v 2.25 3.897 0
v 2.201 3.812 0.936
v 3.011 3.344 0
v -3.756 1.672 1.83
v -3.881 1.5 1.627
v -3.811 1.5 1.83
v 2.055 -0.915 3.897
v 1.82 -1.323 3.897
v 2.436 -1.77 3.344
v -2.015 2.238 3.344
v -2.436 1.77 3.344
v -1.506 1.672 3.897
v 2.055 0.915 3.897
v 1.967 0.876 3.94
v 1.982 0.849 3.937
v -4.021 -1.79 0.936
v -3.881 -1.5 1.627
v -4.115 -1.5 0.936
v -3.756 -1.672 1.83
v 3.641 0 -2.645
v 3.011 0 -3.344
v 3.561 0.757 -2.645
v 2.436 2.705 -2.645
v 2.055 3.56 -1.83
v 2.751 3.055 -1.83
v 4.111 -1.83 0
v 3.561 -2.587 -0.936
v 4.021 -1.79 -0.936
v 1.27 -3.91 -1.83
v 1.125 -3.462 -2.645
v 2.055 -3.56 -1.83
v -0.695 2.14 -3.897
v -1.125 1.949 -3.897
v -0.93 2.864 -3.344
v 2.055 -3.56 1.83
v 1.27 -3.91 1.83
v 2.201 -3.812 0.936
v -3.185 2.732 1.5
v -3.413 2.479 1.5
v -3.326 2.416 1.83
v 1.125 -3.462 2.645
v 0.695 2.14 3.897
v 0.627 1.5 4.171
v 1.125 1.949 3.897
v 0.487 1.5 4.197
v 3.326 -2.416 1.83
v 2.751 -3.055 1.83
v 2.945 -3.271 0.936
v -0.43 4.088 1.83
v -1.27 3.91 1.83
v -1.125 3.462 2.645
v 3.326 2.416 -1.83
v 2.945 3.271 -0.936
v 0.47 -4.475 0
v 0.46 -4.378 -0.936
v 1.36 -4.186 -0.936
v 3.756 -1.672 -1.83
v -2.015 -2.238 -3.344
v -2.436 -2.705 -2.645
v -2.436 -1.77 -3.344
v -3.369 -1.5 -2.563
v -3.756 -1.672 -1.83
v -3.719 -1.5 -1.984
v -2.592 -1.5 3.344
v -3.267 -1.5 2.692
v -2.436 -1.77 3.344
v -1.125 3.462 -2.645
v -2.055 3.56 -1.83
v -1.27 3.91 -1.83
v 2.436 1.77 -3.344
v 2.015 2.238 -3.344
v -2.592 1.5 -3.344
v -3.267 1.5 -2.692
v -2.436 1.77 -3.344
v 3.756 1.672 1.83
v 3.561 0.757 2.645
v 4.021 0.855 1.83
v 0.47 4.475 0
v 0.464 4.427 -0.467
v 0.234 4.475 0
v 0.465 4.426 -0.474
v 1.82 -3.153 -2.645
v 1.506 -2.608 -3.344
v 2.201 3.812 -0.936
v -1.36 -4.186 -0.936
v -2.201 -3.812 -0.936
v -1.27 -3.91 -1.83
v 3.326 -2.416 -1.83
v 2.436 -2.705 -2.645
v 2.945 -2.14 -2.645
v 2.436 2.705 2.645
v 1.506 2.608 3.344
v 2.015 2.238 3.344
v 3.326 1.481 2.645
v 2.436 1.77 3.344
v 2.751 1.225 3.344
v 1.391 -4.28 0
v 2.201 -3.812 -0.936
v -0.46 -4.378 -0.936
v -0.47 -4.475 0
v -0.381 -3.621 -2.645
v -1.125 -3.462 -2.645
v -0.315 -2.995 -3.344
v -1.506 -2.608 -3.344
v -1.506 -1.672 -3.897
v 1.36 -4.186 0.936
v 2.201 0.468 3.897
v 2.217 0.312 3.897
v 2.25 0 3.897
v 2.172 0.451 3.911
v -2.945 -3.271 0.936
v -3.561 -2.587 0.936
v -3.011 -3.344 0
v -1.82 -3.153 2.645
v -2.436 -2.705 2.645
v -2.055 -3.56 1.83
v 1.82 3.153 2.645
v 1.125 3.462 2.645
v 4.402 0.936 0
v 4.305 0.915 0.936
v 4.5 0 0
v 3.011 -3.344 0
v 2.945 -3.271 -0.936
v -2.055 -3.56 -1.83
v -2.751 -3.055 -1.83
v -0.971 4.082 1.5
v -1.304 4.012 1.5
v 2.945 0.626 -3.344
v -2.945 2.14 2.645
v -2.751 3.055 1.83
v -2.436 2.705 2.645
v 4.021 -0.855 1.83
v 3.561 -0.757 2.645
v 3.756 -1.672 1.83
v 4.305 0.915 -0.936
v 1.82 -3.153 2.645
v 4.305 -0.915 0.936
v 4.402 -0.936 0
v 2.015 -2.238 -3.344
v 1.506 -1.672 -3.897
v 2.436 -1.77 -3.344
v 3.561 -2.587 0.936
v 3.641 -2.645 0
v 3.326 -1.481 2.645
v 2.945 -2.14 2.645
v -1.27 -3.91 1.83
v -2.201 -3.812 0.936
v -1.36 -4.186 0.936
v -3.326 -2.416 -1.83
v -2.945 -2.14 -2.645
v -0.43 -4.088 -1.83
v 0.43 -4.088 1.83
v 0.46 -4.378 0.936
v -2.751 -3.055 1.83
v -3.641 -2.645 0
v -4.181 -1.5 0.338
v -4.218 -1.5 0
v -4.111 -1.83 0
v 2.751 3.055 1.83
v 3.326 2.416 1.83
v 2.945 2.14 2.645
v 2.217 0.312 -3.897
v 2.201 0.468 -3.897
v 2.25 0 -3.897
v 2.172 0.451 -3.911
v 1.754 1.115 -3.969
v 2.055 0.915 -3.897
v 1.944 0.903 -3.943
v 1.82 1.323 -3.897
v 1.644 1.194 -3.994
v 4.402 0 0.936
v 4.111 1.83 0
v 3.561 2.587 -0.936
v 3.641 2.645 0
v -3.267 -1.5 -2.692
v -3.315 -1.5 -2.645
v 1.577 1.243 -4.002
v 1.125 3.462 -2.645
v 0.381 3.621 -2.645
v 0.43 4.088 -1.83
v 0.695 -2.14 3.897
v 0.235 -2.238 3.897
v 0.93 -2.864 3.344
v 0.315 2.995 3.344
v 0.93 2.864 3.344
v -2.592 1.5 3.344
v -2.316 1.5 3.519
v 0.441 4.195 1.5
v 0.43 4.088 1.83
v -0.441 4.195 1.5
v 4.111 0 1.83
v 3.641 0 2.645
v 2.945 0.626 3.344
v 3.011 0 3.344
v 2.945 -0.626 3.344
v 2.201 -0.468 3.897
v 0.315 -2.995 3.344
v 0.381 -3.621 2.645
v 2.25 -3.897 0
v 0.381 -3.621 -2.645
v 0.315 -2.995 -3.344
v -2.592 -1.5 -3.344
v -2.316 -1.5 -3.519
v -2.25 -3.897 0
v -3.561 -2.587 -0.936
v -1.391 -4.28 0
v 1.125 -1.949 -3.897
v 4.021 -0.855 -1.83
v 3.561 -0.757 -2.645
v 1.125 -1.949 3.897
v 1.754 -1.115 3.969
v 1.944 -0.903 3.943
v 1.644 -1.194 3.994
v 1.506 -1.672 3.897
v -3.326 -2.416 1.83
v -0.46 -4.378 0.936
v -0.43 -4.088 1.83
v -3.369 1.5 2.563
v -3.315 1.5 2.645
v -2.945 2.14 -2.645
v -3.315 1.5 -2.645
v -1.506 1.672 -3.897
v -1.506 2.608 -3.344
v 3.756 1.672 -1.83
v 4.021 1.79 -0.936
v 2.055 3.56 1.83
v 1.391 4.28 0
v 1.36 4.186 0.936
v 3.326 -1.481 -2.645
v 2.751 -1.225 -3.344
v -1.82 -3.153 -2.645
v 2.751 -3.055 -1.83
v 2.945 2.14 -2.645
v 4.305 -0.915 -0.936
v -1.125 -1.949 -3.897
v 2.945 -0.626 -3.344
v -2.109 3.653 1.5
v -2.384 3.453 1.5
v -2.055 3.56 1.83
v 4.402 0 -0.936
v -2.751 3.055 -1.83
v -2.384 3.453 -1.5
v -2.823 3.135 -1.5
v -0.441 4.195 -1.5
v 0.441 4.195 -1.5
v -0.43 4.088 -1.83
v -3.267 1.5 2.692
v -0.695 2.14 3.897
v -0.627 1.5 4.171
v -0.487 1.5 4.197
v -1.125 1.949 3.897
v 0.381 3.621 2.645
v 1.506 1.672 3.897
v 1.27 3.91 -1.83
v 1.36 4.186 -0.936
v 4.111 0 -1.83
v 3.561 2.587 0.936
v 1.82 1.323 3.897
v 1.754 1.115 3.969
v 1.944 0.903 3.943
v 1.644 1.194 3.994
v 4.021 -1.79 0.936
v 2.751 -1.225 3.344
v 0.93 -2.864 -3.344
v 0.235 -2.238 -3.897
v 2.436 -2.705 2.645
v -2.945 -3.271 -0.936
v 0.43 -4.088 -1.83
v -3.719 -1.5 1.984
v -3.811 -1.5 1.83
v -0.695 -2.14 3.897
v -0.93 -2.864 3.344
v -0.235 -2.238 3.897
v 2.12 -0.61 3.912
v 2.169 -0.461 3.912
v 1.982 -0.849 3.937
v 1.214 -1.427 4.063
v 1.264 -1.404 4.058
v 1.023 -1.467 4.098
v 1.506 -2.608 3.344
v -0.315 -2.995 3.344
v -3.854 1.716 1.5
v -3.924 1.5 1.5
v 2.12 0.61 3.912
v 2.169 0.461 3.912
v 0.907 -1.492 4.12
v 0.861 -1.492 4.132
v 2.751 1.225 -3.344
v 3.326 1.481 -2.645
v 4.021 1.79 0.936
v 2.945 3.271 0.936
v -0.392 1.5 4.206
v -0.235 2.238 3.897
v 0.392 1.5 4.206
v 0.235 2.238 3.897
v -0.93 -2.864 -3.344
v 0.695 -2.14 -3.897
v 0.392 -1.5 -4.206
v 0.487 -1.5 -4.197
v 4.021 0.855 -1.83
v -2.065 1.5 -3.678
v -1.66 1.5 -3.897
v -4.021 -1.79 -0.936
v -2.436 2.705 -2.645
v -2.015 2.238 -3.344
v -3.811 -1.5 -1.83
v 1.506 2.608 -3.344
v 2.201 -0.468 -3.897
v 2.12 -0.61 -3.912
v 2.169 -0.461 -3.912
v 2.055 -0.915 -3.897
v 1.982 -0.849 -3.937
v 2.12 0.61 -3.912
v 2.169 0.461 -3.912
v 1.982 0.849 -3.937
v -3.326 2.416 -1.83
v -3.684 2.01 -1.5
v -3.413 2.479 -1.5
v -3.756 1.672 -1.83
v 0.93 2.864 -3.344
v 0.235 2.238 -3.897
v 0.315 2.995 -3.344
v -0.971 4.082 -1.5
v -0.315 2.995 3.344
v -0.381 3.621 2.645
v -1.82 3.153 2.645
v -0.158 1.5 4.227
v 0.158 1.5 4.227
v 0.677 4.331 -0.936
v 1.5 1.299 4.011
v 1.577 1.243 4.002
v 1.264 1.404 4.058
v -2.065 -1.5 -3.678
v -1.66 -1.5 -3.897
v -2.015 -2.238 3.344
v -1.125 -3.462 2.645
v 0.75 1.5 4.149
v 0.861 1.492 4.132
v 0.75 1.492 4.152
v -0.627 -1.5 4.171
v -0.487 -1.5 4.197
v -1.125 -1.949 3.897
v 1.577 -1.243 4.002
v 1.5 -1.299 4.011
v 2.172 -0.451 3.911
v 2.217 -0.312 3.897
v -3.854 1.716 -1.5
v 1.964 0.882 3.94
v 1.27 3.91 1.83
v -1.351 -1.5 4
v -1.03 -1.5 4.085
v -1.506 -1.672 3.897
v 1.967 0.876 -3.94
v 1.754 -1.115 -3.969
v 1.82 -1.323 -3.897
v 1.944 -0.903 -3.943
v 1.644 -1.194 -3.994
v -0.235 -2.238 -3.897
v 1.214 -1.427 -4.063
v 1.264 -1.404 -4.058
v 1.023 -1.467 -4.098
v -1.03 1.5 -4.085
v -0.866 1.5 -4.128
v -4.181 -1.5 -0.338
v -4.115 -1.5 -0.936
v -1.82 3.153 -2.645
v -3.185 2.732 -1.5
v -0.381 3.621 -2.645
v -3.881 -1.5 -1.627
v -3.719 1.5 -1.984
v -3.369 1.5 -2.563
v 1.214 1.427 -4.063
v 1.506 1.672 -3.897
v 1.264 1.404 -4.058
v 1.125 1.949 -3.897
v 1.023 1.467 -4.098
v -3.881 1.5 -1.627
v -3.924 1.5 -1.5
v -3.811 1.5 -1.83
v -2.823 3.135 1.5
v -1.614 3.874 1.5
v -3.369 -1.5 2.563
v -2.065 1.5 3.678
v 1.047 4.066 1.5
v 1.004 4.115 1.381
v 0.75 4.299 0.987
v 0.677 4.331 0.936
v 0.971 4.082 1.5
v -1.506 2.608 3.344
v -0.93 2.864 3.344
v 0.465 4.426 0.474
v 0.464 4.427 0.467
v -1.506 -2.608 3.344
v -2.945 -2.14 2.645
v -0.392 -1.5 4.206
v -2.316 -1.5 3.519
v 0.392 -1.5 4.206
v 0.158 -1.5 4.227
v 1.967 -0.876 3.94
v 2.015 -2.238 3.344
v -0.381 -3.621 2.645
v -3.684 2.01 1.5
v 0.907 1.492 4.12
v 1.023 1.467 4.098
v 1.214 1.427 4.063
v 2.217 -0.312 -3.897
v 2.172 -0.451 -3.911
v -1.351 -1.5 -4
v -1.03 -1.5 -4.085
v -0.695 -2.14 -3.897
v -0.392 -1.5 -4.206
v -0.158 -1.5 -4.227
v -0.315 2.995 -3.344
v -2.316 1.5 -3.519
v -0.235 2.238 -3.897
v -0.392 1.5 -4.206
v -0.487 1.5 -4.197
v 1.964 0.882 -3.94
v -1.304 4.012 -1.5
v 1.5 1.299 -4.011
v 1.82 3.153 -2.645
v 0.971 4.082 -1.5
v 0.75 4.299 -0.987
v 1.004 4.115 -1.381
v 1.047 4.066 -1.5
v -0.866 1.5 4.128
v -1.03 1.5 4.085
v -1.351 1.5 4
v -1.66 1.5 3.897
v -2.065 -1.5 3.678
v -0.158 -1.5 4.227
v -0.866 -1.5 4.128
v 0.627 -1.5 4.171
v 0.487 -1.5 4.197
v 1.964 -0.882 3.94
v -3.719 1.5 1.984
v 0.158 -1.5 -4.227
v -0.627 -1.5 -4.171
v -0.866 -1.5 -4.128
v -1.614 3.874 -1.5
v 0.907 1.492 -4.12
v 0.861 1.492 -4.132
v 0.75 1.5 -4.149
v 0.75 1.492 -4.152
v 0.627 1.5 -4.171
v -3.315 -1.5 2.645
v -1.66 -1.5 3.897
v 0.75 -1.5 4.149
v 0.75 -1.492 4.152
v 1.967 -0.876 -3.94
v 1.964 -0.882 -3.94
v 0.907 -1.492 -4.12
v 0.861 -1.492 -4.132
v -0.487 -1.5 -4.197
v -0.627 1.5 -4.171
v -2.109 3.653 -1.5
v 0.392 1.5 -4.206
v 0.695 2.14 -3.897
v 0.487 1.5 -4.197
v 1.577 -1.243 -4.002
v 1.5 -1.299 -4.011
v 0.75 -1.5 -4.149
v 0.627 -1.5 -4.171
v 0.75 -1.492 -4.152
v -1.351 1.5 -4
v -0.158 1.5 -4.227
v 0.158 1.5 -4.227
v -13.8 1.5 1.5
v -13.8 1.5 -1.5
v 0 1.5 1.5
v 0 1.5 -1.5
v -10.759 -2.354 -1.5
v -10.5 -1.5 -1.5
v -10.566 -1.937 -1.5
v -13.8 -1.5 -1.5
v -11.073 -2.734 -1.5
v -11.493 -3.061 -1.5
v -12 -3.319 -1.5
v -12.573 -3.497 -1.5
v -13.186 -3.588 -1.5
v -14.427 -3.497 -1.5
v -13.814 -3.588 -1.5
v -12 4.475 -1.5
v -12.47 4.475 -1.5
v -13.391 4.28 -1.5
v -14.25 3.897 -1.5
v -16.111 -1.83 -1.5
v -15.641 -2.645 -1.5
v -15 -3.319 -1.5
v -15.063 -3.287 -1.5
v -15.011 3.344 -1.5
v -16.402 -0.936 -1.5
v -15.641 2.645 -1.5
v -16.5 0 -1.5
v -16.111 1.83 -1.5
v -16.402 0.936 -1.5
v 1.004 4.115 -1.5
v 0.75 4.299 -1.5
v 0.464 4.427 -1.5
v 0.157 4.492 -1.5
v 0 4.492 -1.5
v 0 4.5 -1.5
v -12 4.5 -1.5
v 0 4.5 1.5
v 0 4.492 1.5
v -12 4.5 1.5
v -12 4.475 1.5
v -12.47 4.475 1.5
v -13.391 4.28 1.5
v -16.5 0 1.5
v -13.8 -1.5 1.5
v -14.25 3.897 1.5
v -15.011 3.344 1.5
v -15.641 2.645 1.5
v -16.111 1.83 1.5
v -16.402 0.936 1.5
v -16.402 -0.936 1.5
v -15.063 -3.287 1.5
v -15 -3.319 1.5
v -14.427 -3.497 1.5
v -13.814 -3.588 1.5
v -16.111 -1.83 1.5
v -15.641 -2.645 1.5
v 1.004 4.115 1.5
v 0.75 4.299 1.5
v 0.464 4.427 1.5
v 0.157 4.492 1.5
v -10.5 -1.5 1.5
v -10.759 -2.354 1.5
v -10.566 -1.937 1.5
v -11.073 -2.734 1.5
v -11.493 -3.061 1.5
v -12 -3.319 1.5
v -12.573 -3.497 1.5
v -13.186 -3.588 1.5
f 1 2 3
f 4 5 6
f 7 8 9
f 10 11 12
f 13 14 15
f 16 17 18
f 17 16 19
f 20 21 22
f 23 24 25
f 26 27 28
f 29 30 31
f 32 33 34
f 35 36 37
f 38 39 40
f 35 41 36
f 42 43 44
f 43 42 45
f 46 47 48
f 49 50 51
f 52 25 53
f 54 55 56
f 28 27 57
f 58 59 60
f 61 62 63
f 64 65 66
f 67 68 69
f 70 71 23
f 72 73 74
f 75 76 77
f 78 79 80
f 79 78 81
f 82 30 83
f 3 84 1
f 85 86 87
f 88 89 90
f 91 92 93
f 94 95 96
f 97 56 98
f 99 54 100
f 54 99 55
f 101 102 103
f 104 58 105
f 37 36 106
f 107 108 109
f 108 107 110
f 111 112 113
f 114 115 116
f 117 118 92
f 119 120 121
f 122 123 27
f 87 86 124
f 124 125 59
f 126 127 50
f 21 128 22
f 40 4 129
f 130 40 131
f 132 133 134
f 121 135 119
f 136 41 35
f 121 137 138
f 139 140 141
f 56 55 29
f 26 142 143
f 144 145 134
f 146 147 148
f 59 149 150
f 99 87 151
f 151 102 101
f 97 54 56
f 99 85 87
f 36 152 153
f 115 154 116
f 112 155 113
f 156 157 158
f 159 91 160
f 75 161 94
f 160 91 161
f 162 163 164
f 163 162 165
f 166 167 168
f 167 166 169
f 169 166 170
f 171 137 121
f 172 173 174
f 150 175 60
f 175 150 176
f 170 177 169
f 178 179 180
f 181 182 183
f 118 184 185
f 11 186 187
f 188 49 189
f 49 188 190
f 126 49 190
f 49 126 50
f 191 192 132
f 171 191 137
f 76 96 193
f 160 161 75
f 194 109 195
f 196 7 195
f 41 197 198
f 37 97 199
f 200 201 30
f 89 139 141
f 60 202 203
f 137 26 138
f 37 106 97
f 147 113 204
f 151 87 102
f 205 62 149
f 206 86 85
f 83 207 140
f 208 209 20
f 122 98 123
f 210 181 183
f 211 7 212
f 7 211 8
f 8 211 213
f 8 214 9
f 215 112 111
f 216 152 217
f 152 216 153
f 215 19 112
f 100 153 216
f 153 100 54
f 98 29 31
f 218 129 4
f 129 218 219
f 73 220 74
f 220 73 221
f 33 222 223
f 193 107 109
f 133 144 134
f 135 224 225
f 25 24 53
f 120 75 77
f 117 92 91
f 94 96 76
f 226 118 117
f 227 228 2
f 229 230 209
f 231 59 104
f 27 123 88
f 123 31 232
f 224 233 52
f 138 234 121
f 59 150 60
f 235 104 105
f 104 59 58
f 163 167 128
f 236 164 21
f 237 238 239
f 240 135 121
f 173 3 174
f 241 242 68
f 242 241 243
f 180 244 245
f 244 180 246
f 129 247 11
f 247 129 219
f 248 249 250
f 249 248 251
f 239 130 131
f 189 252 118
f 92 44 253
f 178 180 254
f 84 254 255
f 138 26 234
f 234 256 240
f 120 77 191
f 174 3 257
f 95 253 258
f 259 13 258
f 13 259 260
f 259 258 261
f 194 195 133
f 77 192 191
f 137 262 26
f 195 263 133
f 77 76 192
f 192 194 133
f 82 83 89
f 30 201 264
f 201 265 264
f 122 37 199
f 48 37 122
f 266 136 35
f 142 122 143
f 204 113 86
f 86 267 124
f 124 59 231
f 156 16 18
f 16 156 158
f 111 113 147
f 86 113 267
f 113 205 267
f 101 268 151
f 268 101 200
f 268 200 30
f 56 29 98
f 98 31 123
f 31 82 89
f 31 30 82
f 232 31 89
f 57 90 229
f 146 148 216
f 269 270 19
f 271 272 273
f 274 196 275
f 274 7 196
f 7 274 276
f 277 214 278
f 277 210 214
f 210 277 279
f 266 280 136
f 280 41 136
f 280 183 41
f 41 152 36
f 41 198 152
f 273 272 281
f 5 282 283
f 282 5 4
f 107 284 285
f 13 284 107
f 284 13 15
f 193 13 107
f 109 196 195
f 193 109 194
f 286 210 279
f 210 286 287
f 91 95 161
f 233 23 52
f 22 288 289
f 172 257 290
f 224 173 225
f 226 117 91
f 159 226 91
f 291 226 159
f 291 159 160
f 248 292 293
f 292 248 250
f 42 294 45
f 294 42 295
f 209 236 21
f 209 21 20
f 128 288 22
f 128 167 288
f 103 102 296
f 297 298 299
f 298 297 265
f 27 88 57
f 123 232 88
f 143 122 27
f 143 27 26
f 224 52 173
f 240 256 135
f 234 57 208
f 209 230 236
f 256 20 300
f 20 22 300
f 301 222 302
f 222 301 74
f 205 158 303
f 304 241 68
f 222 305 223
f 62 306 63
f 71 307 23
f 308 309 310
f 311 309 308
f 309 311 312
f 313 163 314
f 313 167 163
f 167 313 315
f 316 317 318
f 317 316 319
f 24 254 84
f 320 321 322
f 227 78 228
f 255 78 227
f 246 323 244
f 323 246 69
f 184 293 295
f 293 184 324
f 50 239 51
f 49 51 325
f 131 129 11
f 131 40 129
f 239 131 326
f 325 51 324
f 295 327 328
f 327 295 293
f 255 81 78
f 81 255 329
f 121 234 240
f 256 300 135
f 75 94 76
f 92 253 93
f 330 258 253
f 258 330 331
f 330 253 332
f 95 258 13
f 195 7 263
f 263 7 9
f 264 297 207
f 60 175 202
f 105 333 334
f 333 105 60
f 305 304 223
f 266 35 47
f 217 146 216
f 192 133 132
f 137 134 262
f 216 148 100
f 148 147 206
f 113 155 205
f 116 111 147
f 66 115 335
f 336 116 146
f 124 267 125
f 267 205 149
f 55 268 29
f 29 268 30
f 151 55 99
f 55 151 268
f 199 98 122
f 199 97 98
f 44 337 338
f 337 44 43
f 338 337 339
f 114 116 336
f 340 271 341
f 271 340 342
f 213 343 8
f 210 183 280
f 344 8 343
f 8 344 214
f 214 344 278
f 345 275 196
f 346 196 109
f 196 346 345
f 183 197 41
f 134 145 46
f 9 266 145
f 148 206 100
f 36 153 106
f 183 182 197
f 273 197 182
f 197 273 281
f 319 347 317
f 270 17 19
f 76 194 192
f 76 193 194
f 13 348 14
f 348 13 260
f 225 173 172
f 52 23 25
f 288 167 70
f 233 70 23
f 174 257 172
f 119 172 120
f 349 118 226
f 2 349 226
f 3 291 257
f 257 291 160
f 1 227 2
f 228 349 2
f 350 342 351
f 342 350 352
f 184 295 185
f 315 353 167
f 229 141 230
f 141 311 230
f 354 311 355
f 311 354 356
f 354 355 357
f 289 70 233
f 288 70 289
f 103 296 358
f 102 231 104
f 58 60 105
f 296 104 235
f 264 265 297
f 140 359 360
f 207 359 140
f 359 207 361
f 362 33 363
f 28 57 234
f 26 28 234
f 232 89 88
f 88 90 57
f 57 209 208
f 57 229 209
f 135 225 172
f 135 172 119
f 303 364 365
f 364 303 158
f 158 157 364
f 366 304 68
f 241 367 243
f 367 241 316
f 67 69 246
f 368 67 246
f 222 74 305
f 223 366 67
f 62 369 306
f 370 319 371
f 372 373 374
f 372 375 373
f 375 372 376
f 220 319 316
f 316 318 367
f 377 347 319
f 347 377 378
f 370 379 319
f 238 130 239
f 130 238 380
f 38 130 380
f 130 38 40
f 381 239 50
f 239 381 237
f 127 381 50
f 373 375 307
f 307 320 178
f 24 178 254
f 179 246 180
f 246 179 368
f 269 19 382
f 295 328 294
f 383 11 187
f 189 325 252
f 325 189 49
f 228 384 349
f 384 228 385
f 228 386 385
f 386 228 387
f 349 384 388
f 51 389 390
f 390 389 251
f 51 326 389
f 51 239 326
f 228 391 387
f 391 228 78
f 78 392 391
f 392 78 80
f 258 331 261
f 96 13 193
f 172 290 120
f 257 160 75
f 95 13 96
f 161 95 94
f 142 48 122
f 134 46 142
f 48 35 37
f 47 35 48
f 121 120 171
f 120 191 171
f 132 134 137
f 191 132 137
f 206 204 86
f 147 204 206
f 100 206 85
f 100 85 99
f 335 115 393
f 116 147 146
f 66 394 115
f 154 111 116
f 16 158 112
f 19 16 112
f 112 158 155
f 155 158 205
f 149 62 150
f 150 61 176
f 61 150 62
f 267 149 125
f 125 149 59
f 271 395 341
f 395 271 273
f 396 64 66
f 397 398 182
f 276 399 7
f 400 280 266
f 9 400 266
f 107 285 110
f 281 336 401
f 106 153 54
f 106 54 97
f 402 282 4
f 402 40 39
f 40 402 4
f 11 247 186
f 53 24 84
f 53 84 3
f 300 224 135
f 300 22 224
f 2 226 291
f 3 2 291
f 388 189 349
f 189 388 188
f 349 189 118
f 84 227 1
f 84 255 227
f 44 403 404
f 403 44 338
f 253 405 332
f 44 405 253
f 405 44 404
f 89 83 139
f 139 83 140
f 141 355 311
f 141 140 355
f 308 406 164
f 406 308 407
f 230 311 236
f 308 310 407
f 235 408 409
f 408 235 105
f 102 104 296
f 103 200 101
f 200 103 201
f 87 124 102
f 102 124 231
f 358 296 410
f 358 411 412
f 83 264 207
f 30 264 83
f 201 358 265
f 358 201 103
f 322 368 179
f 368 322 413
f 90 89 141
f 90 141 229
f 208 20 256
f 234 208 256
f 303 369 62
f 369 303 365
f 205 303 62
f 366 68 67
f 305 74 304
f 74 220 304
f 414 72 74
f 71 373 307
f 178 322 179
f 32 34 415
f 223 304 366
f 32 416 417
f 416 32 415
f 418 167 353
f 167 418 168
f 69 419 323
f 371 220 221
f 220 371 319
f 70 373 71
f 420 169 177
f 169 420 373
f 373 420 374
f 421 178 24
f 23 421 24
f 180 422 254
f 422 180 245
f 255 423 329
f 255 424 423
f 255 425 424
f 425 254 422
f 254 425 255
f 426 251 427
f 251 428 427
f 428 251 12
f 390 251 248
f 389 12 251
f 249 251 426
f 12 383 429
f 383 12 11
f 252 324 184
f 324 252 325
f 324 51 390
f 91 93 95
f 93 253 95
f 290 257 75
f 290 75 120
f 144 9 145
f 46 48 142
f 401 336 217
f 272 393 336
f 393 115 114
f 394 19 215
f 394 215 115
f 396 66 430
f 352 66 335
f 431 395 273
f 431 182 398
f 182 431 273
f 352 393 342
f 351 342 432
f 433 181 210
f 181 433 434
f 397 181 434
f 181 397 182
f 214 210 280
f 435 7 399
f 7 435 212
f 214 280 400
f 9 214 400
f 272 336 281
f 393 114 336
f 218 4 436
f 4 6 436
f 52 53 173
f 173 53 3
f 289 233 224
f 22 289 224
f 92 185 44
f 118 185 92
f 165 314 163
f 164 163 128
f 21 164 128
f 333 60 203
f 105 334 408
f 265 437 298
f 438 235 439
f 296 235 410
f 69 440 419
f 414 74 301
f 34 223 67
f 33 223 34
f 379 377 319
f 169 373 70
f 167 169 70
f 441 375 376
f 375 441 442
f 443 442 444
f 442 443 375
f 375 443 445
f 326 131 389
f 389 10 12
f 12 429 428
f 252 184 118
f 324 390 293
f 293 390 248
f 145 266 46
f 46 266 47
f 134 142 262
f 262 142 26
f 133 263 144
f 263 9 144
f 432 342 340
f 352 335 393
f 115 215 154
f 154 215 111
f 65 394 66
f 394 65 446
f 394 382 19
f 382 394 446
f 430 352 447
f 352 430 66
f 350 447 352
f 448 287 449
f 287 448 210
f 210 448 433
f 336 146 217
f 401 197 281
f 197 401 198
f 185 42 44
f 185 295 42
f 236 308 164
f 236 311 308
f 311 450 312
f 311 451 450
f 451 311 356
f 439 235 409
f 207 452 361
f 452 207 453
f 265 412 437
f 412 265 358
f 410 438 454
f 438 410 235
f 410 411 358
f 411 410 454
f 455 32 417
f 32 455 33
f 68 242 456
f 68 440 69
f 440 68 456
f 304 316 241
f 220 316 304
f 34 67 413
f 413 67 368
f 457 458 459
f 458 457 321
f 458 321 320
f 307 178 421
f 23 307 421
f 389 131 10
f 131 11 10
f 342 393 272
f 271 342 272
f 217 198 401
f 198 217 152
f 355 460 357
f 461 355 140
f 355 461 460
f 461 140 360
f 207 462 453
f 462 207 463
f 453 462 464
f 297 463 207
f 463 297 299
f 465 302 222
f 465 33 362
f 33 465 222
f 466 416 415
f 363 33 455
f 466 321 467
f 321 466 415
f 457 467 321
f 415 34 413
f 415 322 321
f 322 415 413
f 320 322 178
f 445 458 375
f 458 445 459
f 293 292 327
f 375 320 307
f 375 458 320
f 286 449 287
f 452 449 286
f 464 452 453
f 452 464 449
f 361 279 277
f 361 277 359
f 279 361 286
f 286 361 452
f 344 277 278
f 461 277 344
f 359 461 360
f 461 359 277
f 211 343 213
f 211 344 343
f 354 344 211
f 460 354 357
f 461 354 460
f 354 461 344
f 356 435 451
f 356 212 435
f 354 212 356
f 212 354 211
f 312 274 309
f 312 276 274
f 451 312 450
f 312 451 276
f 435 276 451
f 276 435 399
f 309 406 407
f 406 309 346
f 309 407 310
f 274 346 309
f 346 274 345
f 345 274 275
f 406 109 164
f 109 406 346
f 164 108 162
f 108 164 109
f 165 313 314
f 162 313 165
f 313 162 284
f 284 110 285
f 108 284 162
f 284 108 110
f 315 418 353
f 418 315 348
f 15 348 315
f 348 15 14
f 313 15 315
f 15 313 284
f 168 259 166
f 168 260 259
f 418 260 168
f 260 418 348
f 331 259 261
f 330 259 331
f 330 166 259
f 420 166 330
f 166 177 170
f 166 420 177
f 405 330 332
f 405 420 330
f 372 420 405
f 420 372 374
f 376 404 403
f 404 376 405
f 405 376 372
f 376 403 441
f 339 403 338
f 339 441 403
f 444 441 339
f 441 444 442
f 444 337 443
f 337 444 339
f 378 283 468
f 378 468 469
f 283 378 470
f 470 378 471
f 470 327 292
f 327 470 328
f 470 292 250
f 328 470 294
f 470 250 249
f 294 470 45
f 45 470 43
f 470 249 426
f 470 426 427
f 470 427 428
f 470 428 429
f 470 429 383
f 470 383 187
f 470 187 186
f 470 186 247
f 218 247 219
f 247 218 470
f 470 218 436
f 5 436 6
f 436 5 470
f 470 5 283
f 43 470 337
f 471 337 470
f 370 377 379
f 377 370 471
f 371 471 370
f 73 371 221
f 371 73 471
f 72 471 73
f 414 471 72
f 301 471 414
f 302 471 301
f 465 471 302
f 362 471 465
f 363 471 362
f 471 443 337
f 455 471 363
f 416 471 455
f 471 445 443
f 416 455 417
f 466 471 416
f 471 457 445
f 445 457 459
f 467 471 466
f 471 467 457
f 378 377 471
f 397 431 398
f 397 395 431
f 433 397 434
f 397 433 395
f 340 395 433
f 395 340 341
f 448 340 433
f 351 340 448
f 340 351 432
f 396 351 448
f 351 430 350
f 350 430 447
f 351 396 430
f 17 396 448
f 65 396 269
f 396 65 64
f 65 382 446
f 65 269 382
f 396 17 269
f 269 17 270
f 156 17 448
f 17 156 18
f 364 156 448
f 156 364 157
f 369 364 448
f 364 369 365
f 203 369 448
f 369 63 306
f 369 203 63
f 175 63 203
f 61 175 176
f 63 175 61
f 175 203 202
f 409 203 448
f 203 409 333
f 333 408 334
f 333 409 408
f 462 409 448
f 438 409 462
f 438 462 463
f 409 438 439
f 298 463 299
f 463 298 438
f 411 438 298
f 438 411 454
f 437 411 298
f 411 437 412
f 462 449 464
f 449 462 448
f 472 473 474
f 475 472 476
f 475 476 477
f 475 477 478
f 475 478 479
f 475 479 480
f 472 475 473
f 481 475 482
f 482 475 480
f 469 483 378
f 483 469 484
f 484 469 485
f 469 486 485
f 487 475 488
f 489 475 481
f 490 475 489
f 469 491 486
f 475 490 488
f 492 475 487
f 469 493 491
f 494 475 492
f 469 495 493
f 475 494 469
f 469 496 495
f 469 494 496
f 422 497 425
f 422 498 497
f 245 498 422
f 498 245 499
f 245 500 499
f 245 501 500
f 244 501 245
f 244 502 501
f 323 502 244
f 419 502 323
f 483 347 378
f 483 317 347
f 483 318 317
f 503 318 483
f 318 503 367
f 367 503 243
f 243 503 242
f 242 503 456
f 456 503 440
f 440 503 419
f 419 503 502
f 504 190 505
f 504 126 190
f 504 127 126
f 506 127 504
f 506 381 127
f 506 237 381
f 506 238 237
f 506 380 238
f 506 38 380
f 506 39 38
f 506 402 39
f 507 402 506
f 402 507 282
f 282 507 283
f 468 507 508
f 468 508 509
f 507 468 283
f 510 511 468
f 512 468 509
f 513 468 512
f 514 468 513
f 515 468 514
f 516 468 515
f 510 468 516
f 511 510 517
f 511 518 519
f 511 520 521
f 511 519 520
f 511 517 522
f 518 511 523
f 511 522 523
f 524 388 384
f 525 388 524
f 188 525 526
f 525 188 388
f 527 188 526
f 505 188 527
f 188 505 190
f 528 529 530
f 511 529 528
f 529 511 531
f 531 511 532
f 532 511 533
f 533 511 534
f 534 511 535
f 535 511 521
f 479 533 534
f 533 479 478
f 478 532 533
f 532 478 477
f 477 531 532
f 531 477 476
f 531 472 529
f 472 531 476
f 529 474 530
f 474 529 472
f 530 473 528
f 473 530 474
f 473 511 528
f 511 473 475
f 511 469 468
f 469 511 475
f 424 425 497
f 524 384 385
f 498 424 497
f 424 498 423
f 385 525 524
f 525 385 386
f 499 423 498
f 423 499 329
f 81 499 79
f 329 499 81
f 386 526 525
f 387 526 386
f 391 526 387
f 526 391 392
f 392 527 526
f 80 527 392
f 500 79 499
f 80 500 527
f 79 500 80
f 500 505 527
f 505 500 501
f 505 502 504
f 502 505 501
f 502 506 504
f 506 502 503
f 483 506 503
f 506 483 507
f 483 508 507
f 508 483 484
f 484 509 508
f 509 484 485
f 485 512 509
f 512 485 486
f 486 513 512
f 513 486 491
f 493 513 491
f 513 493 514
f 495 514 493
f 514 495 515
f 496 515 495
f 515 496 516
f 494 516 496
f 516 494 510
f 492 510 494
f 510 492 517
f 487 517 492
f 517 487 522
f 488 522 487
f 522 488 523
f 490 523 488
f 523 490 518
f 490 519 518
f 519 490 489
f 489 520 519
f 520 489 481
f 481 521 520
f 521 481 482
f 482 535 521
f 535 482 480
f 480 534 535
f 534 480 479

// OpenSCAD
//
//  Copyright (C) 21-08-2013 Jasper den Ouden.
//
//  This is free software: you can redistribute it and/or modify
//  it under the terms of the GNU General Public License as published
//  by the Free Software Foundation, either version 3 of the License, or
//  (at your option) any later version.
//

//Idea is to have a think with a hook and another thing with holes that
// both go into belt holes and can pull two belt holes together, shortening
// a section of pants.

$fs=0.1;

r=1.5;
t=3;
gl=8*r;

n=4;

e=0.5;

module belt_hole_grab()
{   difference()
    {   sphere(r+t);
        translate([t/4,0,-4*(r+t)]) linear_extrude(height=8*(r+t))
        {   circle(r);
            translate([-4*r,0]) square([gl,2*r],center=true);
        }
    }
}
module male_part()
{   translate([0,0,-t/2]) linear_extrude(height=t) intersection()
    {   difference()
        {   union()
            {   translate([-gl/2,r+t/2]) square([gl,t],center=true);
                translate([-gl,0]) circle(r+t);
                translate([0,t])circle(r);
            }
            square([2*gl+1.2*t,2*r],center=true);
            rotate(180) square([gl-t/2,8*r]);
        }
        union()
        {
            translate([0,t]) square([4*gl,2*(r+t)],center=true);
            translate([-gl-t/2,-r]) scale([1,0.7]) circle(r+t/2);
        }
    }

}

module male()
{   union(){ belt_hole_grab(); male_part(); } }

module female_part()
{
    d = 2*r+t;
    l = d*n;
    intersection()
    {   translate([0,t]) rotate([90,0,0]) linear_extrude(height=2*t) for( i = [1:n] )
        {
            translate([(i-0.5)*d,0]) scale([1,2]) circle(r-e/2);
        }
        cube([2*l,2*l,t],center=true);
    }
    translate([0,0,-t/2]) linear_extrude(height=t) difference()
    {
        union()
        {   translate([l/2,0]) square([l,3*t],center=true);
            translate([l,0]) circle(1.5*t);
            scale([1/2,1]) circle(1.5*t);
        }
        translate([l/2,0]) square([l,t+e],center=true);
        translate([l,0]) circle((t+e)/2);
    }
                   
}

module female()
{
    translate([0,r+t/2]) rotate(180) rotate([90,0,0]) female_part();
    belt_hole_grab();
}

//Both should be printed on side for best effect..
//female();
male();
